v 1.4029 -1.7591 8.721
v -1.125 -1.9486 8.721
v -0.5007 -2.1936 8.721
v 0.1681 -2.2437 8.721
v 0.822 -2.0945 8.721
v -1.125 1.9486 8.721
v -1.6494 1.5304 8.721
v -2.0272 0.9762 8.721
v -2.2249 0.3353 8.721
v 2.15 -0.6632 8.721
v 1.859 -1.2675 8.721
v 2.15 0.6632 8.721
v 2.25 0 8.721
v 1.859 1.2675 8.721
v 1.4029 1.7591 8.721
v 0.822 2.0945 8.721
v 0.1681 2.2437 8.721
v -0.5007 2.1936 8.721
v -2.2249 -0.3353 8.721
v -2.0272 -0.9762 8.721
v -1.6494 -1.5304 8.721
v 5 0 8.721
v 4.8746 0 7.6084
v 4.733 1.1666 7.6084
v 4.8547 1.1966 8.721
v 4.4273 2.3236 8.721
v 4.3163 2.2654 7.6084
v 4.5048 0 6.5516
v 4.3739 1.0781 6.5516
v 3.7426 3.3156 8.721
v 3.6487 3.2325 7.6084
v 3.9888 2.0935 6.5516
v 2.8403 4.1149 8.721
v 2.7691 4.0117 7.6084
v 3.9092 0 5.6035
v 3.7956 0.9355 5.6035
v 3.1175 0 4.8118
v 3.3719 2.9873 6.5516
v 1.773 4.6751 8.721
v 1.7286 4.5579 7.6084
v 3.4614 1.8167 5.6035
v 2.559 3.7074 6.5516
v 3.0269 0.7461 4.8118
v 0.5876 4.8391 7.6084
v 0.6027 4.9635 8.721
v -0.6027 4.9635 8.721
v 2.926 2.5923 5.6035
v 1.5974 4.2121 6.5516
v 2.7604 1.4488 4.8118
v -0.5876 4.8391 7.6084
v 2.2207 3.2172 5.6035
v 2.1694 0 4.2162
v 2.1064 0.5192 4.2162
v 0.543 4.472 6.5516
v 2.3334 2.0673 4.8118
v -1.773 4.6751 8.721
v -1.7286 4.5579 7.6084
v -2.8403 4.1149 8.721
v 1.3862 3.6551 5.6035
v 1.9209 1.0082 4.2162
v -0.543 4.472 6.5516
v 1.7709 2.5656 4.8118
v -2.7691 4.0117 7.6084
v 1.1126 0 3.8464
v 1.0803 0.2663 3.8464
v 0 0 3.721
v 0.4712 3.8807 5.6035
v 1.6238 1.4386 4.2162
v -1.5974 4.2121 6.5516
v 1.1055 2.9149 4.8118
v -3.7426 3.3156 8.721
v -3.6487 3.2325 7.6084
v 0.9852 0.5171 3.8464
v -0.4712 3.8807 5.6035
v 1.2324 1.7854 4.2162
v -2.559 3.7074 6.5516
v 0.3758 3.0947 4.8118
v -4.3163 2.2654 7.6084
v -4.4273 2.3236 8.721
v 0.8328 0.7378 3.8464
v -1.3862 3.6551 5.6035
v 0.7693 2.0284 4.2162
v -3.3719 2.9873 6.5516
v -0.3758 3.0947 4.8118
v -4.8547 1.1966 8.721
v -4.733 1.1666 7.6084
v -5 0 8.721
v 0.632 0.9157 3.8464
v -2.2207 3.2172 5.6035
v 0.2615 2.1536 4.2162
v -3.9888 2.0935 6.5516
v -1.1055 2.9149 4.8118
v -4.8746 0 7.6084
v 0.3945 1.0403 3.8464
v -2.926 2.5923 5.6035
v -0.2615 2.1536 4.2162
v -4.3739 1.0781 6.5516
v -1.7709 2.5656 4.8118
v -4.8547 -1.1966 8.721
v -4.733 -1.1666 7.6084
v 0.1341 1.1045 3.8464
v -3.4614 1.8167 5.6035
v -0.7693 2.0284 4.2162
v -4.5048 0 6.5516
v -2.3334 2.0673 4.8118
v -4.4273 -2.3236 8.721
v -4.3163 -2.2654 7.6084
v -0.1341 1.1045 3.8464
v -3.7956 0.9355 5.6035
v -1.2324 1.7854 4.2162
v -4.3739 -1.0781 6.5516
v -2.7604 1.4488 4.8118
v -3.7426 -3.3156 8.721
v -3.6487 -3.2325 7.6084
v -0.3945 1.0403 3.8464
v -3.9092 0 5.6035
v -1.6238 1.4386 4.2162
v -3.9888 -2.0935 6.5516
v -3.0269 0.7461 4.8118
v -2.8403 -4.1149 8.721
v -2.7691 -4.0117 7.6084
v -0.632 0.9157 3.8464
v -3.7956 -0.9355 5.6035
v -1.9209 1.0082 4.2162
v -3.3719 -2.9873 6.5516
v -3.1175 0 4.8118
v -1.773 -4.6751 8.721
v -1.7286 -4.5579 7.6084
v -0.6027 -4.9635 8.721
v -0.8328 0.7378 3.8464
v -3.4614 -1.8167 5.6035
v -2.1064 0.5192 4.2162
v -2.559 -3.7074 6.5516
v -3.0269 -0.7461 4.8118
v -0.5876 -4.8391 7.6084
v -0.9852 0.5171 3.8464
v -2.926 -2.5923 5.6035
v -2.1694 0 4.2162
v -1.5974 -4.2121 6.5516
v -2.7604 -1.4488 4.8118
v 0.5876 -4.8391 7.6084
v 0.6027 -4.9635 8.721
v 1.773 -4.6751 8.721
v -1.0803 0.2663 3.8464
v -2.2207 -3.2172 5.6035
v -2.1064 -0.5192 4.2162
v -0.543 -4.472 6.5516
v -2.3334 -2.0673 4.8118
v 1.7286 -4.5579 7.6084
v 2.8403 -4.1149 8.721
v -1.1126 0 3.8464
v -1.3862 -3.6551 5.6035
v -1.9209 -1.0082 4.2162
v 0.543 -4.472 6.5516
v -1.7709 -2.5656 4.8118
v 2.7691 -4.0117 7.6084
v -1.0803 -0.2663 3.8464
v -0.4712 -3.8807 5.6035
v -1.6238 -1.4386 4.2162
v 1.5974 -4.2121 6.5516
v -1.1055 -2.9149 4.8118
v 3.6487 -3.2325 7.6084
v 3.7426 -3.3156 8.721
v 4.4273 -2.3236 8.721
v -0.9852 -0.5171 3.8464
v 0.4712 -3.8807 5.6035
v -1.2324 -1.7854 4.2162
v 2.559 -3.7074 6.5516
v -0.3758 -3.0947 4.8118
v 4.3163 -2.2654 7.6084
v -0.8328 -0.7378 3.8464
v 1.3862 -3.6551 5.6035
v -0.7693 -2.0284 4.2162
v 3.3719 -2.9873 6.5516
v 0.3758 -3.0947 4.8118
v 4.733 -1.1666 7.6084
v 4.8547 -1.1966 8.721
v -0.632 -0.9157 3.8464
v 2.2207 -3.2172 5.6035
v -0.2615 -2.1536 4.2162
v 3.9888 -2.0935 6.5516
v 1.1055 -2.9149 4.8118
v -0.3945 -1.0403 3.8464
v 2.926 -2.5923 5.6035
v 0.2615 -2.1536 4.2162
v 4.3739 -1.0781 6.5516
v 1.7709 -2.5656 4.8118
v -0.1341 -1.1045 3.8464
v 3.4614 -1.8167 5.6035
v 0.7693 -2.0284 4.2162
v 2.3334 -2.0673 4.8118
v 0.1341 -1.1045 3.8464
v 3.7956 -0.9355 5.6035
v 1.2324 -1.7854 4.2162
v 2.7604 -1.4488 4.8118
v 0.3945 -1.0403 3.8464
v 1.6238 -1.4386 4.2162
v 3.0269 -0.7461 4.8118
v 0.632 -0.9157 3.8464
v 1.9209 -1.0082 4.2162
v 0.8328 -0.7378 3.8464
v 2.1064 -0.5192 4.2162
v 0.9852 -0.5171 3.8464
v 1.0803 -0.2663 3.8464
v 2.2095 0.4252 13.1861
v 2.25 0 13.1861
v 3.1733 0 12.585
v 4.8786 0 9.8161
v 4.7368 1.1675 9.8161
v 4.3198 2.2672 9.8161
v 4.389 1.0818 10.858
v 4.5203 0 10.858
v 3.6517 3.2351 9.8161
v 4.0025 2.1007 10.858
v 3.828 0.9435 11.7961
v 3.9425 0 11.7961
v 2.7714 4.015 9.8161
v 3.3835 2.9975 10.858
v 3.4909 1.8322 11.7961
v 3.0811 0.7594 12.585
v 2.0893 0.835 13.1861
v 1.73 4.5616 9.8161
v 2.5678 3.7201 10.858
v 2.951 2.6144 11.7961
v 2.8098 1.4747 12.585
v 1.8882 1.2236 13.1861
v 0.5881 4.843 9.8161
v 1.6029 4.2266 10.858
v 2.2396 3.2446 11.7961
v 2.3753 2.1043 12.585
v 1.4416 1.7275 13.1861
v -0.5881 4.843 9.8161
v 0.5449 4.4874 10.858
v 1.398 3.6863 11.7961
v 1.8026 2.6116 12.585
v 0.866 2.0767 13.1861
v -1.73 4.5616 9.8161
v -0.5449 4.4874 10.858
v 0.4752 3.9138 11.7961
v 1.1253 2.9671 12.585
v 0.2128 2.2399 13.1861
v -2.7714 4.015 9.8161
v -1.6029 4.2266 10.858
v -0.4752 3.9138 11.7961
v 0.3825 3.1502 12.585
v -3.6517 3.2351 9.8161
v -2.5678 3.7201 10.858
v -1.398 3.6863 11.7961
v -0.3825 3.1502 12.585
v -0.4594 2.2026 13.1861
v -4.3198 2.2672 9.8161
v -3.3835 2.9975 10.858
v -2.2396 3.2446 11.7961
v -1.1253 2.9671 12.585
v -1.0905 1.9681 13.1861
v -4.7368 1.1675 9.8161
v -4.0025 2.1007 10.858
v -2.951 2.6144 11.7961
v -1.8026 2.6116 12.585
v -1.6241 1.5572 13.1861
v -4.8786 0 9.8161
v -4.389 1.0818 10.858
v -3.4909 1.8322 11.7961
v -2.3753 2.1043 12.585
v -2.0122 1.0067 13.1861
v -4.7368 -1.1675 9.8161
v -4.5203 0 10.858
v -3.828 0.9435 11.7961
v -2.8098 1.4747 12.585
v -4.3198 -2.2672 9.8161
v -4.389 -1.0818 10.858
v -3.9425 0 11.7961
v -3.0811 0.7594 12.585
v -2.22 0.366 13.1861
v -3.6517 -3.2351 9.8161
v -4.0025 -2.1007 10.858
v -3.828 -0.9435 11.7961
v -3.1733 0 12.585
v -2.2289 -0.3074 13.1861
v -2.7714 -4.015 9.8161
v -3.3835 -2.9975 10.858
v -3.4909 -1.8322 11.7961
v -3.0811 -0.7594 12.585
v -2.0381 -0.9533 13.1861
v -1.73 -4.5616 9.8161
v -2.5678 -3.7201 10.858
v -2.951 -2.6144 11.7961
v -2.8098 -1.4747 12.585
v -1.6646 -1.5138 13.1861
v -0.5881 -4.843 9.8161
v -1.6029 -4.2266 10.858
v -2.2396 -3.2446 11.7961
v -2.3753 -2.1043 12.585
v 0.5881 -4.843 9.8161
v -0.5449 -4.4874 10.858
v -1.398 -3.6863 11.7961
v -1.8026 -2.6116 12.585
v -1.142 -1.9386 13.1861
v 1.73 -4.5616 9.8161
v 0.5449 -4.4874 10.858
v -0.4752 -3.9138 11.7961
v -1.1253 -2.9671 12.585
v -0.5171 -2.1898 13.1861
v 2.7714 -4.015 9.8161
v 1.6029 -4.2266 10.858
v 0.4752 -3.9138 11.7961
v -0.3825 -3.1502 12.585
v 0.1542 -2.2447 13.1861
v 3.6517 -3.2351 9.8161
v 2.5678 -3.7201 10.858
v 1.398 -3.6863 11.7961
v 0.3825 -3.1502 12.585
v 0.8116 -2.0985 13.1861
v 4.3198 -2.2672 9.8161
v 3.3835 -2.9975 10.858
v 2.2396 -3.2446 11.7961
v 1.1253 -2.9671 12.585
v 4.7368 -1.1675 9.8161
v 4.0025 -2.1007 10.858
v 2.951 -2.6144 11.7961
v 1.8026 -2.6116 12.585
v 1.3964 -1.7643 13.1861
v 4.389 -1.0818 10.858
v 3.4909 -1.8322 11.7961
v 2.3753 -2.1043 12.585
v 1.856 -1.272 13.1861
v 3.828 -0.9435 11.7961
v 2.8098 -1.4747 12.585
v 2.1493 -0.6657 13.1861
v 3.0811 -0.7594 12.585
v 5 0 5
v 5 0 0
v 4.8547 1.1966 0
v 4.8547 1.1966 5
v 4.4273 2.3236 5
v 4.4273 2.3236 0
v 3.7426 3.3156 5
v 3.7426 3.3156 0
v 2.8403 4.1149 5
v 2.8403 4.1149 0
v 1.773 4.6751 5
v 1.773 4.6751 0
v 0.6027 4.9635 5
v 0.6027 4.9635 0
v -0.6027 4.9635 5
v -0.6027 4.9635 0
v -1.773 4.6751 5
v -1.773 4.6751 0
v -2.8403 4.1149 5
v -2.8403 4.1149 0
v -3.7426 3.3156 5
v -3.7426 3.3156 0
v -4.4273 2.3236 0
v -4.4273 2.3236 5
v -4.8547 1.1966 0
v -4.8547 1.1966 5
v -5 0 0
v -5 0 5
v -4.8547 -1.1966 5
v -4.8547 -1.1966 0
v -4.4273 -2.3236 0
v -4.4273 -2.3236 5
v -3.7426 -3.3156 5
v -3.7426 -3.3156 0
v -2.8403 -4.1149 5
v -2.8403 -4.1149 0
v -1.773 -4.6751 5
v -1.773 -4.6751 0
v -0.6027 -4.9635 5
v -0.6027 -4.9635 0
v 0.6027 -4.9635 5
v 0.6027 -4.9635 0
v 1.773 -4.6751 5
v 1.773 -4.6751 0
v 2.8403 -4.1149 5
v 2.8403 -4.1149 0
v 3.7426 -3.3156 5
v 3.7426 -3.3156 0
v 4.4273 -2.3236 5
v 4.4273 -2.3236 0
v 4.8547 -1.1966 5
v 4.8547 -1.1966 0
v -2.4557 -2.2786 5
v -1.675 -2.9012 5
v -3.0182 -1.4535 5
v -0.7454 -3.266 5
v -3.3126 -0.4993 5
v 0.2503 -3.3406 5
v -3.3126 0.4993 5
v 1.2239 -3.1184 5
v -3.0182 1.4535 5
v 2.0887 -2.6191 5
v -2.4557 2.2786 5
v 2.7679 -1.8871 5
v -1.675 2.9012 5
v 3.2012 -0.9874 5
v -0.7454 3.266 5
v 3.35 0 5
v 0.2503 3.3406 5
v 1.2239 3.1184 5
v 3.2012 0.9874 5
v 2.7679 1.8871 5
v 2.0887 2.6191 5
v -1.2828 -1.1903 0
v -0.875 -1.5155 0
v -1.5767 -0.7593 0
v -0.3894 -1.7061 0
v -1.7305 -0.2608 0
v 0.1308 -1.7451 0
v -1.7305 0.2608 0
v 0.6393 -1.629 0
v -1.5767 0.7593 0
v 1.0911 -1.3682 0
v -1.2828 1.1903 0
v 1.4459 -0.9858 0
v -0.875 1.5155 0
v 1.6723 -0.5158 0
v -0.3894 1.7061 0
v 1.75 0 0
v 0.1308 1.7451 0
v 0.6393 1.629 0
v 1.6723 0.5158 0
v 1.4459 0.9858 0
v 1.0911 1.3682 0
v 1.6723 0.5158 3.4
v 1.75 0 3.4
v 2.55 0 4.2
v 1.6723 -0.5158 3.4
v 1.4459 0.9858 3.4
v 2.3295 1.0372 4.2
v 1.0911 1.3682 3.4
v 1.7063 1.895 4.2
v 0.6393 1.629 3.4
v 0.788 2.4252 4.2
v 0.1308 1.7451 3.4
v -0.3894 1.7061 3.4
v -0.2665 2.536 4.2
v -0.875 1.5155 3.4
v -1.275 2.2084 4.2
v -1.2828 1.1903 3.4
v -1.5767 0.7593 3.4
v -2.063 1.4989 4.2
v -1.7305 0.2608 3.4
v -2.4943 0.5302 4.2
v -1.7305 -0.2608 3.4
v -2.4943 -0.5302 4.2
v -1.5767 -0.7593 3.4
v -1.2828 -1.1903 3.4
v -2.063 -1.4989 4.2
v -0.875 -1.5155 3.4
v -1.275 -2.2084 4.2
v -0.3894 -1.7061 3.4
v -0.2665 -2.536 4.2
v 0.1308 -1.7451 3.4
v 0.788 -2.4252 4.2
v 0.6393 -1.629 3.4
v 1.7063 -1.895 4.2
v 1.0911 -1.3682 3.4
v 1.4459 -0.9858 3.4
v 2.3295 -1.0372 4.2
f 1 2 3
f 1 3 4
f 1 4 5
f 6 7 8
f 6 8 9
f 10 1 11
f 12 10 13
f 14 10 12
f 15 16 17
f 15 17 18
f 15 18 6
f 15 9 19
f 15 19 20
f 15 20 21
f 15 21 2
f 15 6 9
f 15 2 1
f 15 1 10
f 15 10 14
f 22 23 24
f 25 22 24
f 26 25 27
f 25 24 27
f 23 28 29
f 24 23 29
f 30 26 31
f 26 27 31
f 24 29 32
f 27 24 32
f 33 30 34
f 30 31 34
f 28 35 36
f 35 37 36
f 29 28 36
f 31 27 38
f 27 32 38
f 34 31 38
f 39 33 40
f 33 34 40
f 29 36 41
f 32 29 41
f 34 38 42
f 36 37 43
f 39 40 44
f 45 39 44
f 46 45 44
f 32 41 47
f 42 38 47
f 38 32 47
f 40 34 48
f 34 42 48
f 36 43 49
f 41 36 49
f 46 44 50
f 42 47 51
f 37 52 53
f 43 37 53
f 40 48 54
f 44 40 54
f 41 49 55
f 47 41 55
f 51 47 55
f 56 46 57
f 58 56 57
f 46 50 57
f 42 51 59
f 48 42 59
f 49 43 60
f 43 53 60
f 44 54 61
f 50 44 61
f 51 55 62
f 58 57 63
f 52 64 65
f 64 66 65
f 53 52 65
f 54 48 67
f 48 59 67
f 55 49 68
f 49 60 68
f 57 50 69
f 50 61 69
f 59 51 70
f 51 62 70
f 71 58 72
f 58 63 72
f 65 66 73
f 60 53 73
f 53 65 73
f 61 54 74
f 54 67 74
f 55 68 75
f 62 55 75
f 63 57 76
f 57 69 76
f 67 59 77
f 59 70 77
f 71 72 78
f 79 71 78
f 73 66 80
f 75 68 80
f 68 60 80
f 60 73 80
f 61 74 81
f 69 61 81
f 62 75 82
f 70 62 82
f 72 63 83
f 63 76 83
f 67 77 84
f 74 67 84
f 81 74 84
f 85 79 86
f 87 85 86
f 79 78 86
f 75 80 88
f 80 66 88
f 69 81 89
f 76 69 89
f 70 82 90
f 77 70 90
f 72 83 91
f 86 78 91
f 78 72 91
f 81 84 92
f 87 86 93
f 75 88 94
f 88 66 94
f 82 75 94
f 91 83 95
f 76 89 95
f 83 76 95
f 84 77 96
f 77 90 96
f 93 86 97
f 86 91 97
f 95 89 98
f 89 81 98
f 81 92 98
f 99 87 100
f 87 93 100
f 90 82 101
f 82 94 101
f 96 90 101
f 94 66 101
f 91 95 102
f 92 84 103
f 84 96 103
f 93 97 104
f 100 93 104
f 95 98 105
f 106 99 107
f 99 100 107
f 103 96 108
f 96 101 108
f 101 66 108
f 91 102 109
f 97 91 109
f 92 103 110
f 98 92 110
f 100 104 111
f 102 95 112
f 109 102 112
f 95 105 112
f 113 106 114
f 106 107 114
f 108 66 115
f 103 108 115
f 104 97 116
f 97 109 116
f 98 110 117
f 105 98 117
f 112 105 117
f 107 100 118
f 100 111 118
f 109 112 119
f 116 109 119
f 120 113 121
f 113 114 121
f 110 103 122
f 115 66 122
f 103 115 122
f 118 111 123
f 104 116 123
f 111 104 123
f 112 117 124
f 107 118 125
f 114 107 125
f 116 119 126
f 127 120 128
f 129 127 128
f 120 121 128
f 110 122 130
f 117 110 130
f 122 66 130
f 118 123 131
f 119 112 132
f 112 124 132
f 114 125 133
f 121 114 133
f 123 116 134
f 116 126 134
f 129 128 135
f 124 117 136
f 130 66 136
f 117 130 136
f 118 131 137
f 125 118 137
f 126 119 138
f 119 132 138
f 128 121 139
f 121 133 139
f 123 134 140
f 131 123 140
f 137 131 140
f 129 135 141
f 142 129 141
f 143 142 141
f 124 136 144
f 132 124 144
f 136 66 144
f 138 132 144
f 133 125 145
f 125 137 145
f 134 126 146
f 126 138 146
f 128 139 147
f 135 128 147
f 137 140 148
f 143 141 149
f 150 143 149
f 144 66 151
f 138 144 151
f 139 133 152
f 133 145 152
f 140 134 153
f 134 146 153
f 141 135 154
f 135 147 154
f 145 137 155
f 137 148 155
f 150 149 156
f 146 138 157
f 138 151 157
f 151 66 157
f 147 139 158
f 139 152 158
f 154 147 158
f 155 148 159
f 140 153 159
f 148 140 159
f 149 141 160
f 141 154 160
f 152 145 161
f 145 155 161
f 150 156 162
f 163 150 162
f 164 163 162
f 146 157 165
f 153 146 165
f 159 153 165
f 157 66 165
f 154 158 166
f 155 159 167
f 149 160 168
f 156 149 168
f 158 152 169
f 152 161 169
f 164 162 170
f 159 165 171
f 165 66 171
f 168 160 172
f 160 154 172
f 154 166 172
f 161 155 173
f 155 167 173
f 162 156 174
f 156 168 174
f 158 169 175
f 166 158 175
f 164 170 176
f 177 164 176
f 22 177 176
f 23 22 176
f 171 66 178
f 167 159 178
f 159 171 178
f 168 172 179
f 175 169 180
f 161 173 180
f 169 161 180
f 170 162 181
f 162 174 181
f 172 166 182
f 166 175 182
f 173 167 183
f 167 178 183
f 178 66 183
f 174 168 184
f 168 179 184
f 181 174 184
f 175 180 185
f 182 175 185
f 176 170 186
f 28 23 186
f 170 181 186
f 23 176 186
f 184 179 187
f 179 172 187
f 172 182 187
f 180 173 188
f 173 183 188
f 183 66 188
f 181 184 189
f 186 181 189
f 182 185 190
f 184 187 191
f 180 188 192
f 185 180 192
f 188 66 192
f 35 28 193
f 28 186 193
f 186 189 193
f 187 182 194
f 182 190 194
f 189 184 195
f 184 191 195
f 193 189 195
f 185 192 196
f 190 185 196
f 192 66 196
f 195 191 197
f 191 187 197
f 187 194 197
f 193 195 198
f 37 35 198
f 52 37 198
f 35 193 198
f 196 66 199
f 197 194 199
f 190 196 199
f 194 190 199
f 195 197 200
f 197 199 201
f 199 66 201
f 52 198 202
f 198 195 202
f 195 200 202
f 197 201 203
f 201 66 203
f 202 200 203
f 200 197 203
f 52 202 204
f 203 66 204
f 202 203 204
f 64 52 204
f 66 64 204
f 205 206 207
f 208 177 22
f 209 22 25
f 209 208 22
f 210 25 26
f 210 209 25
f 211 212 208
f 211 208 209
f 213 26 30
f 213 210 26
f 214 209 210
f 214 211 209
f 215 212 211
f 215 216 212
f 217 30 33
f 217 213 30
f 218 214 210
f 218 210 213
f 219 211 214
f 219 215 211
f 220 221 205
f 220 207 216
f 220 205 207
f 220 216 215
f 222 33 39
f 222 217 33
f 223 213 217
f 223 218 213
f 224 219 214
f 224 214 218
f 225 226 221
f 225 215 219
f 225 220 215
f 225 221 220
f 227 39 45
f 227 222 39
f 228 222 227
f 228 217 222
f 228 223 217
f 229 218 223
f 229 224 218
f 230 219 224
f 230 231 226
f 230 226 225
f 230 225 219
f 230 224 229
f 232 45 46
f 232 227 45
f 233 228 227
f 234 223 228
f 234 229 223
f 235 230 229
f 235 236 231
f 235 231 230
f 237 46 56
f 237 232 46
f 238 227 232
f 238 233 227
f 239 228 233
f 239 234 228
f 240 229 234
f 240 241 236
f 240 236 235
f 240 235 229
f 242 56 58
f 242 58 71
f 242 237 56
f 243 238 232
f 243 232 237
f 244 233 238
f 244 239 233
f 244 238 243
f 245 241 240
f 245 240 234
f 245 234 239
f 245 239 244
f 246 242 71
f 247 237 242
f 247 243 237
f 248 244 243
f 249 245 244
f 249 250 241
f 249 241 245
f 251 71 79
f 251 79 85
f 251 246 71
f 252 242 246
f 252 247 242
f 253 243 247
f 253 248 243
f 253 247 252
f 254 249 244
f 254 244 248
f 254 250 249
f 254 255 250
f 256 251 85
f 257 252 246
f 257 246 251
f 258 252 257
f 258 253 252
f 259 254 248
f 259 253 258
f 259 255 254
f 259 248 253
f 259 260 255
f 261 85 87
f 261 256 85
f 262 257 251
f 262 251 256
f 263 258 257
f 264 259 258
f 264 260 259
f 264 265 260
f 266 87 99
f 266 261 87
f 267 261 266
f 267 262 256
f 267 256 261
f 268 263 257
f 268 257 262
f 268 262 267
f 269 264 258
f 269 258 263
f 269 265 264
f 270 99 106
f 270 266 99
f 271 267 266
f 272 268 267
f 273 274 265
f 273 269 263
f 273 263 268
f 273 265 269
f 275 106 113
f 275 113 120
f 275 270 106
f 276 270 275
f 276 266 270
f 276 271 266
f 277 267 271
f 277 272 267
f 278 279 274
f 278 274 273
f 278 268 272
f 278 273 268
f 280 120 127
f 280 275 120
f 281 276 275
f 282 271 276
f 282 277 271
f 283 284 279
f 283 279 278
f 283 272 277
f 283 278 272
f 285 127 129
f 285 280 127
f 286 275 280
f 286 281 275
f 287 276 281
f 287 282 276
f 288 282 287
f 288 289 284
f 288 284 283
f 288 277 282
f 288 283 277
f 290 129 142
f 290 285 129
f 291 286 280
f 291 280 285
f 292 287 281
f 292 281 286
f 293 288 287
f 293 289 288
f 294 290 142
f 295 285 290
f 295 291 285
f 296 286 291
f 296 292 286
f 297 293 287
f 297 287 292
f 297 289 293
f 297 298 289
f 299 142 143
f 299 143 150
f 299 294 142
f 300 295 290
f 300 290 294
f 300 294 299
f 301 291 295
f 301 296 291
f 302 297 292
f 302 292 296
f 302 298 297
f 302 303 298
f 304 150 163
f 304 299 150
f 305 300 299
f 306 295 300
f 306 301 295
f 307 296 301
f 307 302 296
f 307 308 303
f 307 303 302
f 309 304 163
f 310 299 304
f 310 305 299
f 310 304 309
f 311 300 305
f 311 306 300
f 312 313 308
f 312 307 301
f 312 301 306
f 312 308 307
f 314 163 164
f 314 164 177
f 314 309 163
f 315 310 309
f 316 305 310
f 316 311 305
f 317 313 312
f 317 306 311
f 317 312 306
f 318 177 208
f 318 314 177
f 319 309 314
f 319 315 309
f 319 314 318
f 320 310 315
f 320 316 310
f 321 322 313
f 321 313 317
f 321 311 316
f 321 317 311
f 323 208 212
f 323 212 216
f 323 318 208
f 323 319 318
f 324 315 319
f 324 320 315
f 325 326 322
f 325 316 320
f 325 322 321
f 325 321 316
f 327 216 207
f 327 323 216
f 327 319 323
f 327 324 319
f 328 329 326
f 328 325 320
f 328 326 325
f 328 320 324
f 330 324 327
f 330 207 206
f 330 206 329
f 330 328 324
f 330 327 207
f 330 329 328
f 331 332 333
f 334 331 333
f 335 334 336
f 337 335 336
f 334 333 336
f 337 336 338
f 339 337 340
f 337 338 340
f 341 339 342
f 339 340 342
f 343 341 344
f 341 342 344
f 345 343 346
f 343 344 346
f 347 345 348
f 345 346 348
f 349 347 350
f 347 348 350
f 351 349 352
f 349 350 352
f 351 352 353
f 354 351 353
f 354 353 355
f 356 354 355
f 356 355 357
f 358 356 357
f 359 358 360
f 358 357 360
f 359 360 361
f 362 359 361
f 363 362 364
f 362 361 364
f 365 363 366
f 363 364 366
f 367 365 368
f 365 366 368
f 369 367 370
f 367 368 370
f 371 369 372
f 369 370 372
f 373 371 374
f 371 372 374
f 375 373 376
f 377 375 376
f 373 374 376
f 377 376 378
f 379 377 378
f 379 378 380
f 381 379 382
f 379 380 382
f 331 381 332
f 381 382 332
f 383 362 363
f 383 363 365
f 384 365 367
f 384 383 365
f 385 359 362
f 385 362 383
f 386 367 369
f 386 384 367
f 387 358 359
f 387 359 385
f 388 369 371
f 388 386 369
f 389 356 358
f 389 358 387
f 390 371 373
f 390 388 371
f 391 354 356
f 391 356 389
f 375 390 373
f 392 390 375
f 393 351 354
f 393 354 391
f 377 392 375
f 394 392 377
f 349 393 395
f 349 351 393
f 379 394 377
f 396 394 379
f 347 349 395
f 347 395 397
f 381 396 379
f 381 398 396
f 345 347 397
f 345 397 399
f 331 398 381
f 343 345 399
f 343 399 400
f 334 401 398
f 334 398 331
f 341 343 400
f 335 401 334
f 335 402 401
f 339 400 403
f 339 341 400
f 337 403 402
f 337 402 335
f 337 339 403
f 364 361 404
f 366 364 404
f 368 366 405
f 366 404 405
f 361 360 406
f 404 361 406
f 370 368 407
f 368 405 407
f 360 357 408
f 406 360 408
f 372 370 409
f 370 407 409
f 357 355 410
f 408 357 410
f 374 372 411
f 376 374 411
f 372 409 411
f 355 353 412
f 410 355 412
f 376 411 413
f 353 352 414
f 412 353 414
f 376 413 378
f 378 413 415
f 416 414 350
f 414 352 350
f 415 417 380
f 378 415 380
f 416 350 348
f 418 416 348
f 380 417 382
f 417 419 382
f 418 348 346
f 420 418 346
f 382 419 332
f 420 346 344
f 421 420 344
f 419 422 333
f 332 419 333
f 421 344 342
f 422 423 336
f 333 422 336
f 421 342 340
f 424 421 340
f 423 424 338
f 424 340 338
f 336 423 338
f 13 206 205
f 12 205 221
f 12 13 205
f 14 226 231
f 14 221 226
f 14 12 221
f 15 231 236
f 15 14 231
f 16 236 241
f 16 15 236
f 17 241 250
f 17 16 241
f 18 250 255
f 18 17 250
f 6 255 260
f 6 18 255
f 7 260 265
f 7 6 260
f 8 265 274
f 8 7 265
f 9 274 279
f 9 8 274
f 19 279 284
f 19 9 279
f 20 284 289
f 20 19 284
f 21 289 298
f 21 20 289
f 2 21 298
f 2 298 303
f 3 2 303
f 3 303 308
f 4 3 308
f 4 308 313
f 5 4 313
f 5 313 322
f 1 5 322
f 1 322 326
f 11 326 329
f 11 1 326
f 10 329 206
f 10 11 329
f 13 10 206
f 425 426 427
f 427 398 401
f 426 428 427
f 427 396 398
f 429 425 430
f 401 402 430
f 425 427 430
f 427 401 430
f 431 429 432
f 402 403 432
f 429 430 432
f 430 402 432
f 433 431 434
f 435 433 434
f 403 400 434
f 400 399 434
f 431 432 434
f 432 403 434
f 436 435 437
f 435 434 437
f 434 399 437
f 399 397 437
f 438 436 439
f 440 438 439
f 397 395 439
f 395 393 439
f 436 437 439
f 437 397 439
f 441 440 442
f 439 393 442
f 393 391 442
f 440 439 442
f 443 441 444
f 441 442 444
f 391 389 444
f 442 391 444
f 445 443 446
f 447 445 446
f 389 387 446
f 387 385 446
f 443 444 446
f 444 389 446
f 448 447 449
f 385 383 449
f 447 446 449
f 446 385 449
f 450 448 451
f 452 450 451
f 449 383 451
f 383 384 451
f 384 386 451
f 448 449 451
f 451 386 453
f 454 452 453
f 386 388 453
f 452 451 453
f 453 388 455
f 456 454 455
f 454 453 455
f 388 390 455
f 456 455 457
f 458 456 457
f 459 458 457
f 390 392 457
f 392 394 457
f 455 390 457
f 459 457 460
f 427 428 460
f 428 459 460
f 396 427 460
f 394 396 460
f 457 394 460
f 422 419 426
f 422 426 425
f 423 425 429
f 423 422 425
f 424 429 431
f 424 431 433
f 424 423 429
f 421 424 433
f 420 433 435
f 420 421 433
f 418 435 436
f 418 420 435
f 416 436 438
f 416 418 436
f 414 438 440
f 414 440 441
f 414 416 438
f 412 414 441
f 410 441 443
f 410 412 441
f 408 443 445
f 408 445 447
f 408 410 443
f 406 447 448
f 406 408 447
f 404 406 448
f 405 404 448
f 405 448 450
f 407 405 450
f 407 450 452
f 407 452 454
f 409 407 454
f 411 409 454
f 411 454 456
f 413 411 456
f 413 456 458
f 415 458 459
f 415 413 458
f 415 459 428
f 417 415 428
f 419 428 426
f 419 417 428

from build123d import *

# Parameters (mm, degrees)
F0_R     = 5
F0_R_2   = 1.75
F1_DEPTH = 5
F2_SIZE  = 1.6
F4_R     = 5
F4_R_2   = 2.25
F5_DEPTH = 5
F6_R     = 4.99999
F7_DEPTH = 10


# Not quite as in the source:
# - a fillet or chamfer is up to 0.001 mm smaller than in the source, because OpenCascade refuses the exact size


with BuildPart() as f1:
    # F0 (on Top) → F1 (new body)
    with BuildSketch(Plane.XY):
        Circle(F0_R)
        Circle(F0_R_2, mode=Mode.SUBTRACT)
    extrude(amount=F1_DEPTH)

    # F2
    f2_edges = [f1.edges().sort_by_distance(p)[0] for p in [
        (-1.75, 0, 5),
    ]]
    chamfer(f2_edges, length=F2_SIZE)


with BuildPart() as f5:
    # F4 (on offset) → F5 (new body, symmetric)
    with BuildSketch(Plane.XY.offset(8.721)):
        Circle(F4_R)
        Circle(F4_R_2, mode=Mode.SUBTRACT)
        Circle(F4_R_2)
    extrude(amount=F5_DEPTH, both=True)

    # F6 (radius 5 in the source; OpenCascade refuses exactly that, so slightly less here)
    f6_edges = [f5.edges().sort_by_distance(p)[0] for p in [
        (-5, 0, 3.721),
        (5, 0, 8.721),
        (-5, 0, 13.721),
    ]]
    fillet(f6_edges, radius=F6_R)

    # F4 (on offset) → F7 (cut)
    with BuildSketch(Plane.XY.offset(8.721)):
        Circle(F4_R_2)
    extrude(amount=F7_DEPTH, mode=Mode.SUBTRACT)


solid = Compound([f1.part, f5.part])
